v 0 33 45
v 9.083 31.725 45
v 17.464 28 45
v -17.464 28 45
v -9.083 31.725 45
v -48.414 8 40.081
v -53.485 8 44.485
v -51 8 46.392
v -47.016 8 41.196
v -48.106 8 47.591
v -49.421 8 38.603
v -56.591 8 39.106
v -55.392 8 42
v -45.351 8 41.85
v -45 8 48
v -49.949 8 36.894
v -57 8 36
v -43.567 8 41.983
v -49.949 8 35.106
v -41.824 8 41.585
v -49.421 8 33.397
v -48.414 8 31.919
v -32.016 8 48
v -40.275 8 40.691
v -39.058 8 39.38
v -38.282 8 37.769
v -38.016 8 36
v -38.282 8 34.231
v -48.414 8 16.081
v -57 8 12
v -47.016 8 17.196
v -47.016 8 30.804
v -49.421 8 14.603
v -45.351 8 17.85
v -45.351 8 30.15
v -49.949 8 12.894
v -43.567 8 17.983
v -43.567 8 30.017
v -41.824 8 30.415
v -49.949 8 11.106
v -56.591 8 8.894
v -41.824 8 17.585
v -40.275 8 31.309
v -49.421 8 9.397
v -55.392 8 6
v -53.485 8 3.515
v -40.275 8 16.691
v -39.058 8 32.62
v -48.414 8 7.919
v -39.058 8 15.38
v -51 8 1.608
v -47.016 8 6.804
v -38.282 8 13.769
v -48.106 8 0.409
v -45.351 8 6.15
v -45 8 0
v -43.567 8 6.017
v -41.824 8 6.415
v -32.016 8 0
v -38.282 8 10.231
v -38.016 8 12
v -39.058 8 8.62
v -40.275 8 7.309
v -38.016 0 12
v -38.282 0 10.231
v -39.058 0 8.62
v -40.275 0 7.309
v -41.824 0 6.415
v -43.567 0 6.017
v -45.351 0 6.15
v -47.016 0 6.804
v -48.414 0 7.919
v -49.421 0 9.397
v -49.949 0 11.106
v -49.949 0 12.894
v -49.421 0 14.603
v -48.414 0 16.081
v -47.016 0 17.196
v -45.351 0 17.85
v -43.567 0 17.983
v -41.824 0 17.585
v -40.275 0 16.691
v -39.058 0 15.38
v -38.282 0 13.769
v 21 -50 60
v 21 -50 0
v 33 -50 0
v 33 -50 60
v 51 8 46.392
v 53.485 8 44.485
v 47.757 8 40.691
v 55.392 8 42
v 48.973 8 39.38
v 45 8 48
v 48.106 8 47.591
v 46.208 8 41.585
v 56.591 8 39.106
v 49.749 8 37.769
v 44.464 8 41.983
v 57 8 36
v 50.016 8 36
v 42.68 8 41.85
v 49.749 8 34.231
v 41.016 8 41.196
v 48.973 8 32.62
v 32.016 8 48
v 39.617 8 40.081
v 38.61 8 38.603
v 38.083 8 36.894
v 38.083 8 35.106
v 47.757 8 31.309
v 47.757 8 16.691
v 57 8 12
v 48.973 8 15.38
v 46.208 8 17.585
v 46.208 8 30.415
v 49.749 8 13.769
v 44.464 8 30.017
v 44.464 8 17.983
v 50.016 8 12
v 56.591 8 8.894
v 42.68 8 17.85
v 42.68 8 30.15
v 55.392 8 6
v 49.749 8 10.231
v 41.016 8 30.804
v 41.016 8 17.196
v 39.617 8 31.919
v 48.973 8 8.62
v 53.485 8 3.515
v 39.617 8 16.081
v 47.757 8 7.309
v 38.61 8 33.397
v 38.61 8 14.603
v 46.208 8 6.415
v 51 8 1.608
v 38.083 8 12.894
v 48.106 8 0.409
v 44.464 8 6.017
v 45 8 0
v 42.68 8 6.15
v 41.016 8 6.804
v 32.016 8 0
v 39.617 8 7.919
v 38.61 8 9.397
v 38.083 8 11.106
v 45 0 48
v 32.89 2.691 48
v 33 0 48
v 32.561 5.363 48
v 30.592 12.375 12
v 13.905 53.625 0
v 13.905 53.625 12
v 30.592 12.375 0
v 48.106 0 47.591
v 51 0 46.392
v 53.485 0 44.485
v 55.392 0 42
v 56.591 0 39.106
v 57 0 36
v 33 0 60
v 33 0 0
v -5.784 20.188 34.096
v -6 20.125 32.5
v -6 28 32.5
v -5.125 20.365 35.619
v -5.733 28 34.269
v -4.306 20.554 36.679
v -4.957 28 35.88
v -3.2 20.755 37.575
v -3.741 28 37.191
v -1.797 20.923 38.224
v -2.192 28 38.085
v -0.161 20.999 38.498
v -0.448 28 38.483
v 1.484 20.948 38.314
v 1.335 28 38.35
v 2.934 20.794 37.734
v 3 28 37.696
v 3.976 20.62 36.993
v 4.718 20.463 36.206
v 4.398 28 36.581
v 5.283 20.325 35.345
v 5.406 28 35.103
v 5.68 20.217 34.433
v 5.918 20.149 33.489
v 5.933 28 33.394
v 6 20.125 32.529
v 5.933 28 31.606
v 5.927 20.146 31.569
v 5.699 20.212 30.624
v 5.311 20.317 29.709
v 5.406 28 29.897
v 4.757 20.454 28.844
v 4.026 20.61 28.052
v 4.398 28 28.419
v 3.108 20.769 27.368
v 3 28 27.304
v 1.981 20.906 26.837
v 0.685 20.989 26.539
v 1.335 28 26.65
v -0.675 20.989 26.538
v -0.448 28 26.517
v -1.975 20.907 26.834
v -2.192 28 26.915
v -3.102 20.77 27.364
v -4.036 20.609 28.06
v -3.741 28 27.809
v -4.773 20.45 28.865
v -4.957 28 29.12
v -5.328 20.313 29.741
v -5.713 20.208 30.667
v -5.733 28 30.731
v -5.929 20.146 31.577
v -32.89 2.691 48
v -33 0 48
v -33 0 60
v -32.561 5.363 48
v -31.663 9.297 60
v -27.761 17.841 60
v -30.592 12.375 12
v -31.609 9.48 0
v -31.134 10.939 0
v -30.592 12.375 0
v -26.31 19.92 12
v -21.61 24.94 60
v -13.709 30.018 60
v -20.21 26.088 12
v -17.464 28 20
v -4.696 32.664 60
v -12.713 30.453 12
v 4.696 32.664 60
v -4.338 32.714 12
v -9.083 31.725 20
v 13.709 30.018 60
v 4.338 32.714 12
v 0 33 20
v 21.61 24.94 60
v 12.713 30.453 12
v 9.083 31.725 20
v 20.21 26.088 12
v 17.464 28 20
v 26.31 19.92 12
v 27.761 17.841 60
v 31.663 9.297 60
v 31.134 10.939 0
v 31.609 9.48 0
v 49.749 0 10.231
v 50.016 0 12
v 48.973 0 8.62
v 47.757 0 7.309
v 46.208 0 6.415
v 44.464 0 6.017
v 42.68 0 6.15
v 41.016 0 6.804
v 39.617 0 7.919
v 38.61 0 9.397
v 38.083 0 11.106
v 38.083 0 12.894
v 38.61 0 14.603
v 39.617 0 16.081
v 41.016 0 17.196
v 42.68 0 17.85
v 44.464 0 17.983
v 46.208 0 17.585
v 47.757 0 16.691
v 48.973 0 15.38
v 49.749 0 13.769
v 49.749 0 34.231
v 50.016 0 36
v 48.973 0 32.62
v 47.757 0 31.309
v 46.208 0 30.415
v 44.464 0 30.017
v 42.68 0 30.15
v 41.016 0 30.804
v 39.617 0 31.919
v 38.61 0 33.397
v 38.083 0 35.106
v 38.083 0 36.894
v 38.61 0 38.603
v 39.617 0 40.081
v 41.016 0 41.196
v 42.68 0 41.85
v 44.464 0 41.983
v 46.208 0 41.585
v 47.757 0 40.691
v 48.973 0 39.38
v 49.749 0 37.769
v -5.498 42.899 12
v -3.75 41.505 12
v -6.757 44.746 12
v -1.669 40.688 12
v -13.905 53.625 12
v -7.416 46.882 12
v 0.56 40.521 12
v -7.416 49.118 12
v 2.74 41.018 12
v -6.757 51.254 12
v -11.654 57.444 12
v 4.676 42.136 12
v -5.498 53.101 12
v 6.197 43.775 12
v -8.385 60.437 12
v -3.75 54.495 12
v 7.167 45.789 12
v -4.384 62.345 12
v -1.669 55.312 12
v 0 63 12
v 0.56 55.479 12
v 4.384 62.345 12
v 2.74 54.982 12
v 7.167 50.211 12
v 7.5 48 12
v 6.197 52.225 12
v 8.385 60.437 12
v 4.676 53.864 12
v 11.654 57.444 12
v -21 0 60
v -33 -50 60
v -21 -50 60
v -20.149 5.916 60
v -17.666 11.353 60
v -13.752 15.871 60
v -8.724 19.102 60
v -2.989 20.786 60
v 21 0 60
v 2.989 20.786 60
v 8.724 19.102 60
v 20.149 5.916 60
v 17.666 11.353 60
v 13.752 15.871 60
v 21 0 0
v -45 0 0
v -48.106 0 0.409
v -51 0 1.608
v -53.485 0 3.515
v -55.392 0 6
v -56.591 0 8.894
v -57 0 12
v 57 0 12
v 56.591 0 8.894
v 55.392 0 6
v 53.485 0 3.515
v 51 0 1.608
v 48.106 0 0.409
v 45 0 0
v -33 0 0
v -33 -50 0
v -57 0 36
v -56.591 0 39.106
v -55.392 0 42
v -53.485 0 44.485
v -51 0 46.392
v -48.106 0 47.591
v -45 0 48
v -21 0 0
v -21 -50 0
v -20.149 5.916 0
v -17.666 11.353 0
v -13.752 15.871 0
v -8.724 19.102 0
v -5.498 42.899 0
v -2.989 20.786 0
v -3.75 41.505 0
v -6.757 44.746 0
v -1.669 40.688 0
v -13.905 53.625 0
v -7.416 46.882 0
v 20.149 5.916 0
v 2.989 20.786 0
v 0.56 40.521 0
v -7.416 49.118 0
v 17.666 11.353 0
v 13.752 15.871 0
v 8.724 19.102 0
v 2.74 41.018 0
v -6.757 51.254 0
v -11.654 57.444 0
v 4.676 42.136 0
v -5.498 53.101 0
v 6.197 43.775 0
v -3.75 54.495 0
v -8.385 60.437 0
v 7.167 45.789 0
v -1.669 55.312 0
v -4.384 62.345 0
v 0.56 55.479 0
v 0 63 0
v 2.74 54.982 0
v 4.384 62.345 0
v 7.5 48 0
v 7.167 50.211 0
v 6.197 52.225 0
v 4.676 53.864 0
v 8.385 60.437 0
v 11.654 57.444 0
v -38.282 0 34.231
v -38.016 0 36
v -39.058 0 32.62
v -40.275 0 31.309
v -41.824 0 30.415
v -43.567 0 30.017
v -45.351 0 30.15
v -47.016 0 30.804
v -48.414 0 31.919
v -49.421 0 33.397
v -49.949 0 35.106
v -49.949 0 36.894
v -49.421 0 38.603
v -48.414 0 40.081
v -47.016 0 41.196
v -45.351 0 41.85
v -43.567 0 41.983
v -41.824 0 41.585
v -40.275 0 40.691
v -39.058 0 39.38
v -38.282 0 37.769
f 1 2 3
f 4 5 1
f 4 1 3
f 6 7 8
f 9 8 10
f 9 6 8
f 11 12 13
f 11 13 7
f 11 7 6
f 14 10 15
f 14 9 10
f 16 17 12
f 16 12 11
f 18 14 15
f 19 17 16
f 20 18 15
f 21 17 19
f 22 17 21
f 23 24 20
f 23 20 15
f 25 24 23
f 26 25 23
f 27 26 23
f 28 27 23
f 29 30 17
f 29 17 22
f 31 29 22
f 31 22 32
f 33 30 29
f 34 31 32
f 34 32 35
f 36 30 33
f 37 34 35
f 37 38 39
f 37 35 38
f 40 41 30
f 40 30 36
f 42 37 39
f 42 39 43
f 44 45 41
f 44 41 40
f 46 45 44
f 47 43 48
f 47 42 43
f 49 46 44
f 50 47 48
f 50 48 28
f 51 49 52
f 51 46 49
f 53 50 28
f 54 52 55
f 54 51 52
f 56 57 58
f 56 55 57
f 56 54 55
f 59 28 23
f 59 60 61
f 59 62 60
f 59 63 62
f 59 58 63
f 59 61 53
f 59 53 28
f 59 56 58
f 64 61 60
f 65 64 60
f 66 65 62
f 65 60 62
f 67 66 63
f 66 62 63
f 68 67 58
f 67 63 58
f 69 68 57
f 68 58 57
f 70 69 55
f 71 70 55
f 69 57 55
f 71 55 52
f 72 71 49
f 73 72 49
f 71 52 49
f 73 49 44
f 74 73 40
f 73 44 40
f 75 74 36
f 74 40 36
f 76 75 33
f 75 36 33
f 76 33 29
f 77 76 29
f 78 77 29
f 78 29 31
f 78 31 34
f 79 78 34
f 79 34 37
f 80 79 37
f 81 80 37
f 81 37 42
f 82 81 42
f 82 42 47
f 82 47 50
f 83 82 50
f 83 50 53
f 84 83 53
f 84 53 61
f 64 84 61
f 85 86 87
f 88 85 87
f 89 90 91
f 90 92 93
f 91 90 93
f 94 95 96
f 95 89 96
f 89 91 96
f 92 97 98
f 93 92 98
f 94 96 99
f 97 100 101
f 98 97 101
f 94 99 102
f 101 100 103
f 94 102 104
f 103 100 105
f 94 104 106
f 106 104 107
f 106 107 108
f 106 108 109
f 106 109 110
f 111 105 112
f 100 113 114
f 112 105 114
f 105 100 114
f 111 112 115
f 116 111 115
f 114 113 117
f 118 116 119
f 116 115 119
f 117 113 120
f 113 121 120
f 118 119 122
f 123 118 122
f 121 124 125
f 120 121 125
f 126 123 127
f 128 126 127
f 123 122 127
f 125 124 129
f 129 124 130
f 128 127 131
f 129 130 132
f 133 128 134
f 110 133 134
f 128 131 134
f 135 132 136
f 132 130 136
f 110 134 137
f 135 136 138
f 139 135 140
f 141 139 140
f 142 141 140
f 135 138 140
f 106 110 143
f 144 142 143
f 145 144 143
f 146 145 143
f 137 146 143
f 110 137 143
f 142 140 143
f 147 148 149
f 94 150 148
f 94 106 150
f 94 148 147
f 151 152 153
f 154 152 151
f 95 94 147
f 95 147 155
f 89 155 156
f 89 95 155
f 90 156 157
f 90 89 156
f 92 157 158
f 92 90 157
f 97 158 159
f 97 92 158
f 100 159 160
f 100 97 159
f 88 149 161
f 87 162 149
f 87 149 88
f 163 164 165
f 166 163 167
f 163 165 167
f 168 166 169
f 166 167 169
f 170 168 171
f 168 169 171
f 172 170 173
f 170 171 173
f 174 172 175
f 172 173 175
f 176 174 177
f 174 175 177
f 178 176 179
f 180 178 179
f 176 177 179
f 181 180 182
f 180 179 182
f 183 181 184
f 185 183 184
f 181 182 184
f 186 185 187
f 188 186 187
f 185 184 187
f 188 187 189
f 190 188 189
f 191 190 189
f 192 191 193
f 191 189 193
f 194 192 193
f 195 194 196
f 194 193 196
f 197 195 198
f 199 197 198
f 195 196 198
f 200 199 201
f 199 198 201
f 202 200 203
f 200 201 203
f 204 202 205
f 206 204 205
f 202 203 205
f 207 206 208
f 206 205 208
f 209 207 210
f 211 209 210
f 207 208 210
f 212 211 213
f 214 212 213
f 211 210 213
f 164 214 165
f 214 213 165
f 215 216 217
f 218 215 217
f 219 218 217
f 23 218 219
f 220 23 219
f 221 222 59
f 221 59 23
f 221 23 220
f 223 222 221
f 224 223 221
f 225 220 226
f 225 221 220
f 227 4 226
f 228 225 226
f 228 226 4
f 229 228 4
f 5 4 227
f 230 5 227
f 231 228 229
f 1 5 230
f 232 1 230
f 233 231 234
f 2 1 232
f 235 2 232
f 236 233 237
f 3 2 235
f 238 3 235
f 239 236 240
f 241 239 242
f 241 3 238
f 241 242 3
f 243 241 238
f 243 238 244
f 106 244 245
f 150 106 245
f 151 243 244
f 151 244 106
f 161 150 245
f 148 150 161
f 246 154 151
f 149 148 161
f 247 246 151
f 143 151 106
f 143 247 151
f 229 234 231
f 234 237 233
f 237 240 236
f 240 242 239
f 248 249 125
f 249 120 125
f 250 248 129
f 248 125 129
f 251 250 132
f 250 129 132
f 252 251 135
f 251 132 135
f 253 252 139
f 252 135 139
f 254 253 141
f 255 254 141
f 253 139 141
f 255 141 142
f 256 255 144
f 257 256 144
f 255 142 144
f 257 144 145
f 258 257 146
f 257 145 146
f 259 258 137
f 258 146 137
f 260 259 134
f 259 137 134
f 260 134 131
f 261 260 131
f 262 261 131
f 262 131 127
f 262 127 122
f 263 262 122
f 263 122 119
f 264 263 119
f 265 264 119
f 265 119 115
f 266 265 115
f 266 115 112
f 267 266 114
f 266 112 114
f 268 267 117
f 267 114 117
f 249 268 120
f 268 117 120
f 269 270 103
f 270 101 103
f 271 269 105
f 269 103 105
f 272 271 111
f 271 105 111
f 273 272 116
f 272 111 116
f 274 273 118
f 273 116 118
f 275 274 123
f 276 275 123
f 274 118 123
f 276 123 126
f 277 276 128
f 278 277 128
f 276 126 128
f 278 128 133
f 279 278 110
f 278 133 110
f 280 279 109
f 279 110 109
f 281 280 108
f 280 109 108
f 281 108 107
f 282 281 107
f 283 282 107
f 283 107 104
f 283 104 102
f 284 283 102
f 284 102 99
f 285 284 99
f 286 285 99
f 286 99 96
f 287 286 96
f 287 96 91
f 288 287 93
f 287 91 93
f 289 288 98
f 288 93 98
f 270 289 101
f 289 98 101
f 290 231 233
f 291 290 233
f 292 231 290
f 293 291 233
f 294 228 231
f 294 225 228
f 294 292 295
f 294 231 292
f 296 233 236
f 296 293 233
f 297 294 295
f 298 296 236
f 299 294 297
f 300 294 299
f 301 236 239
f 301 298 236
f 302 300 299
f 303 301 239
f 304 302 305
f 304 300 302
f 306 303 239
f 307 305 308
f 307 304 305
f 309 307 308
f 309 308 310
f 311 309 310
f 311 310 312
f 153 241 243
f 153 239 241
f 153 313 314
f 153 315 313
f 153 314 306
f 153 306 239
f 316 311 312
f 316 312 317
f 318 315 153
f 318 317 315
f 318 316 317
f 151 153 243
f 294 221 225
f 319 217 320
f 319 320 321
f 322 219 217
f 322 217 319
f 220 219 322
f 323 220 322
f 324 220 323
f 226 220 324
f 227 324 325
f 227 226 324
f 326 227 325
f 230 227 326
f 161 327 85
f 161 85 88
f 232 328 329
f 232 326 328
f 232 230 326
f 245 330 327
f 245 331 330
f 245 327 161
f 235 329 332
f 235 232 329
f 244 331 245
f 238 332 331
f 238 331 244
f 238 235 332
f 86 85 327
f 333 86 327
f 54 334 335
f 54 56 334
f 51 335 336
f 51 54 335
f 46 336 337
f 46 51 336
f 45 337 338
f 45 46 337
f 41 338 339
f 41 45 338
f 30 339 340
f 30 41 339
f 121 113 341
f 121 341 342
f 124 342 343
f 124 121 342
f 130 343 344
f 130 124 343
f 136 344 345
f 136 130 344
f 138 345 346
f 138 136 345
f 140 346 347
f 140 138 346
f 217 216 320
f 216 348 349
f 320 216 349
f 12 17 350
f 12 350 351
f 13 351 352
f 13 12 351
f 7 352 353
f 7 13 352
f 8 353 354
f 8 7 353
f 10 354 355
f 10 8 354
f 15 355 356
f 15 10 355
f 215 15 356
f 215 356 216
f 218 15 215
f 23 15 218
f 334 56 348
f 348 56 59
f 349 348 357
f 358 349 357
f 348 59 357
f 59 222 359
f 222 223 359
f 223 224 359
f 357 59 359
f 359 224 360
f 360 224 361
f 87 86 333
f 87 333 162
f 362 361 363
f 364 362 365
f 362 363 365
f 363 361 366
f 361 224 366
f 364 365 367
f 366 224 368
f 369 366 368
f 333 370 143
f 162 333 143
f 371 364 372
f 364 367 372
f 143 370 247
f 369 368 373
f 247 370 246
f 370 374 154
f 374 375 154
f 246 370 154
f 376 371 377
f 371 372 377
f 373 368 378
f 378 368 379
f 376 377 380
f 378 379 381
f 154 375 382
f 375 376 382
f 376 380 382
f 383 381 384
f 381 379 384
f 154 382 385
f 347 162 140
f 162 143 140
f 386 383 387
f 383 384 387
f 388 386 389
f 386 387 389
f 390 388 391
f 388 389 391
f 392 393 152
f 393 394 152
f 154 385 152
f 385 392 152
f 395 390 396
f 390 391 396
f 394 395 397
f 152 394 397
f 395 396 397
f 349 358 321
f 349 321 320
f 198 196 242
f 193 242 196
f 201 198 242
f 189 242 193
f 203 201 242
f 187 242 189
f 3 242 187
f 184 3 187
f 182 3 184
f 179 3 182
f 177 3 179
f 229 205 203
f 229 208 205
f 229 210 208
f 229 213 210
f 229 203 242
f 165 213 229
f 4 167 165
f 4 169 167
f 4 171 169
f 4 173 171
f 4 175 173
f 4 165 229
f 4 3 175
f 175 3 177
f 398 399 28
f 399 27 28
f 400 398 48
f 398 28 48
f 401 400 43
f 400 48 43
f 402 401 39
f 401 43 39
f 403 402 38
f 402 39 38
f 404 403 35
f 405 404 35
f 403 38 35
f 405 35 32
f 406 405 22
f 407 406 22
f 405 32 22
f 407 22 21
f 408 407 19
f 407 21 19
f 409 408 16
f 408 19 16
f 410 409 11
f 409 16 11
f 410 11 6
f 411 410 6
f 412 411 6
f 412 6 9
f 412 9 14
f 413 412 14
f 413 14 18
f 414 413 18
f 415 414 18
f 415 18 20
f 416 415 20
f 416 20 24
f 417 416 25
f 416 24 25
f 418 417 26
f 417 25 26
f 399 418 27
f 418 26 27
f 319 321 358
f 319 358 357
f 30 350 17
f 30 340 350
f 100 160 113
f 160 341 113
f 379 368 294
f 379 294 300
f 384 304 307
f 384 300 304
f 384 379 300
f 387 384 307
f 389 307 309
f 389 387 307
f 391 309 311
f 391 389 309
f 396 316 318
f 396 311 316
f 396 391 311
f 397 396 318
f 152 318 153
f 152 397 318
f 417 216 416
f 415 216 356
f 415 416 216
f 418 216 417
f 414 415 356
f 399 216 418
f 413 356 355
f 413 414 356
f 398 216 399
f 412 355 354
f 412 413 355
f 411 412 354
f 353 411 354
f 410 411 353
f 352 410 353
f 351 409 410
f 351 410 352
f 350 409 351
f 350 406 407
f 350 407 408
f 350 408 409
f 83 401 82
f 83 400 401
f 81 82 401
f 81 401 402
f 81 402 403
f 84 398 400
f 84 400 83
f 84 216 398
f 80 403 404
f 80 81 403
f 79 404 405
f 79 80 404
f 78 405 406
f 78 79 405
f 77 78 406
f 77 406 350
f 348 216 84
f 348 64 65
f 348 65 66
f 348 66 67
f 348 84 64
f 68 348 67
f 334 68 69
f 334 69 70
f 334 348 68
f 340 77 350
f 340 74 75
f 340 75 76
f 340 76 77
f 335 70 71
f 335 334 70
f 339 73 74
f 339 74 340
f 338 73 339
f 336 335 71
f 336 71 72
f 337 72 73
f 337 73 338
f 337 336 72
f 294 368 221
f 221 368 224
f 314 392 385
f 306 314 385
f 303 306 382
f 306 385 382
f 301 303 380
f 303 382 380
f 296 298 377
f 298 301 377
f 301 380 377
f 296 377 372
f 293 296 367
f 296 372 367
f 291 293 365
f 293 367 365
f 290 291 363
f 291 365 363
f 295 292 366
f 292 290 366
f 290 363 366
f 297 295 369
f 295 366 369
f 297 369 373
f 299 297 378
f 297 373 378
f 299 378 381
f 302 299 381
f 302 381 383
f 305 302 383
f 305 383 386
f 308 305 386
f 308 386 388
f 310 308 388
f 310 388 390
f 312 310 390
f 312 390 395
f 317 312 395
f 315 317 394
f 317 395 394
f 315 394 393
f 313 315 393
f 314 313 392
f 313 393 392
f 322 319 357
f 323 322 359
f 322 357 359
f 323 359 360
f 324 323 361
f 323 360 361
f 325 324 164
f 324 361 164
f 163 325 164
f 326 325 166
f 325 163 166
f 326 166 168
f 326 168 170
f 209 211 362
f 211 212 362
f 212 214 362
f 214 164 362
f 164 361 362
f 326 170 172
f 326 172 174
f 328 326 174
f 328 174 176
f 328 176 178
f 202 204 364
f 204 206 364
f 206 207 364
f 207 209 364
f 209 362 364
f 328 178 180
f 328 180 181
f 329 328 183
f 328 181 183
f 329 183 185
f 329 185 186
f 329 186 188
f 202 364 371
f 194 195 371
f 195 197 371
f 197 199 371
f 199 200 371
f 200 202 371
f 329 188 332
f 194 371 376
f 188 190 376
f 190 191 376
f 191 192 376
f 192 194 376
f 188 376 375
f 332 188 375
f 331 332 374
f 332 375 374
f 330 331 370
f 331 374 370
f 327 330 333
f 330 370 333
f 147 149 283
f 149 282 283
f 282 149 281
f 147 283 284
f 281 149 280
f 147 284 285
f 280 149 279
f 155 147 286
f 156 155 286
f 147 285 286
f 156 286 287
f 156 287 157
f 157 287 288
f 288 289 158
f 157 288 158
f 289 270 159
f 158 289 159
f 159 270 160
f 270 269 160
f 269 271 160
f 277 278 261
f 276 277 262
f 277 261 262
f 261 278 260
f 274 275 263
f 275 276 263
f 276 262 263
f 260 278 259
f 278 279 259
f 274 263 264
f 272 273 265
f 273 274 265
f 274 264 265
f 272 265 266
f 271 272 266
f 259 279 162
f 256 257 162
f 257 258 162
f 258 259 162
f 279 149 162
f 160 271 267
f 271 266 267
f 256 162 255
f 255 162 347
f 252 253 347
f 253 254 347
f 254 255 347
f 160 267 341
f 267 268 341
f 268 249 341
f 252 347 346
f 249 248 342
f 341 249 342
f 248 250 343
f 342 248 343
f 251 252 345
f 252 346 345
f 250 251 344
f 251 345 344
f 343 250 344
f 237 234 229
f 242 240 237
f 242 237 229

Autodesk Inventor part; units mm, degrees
ref_plane "YZ Plane" through (0, 0, 0) normal (1, 0, 0) x (0, 1, 0)
ref_plane "XY Plane" through (0, 0, 0) normal (0, 0, 1) x (1, 0, 0)
sketch "Boceto1" plane through (0, 0, 0) normal (0, 0, 1) x (1, 0, 0)
  line L0 (0, 100) -> (0, -100) construction
  line L1 (-100, 0) -> (100, 0) construction
  line L2 (-21, -50) -> (-21, 0)
  line L3 (21, -50) -> (21, 0)
  arc A0 (21, 0) -> (-21, 0) centre (0, 0) ccw
  arc A1 (33, 0) -> (-33, 0) centre (0, 0) ccw
  line L4 (-33, 0) -> (-33, -50)
  line L5 (33, 0) -> (33, -50)
  line L6 (-21, -50) -> (-33, -50)
  line L7 (21, -50) -> (33, -50)
  circle A2 centre (0, 48) radius 7.5
  arc A3 (13.9054, 53.625) -> (-13.9054, 53.625) centre (0, 48) ccw
  line L8 (-13.9054, 53.625) -> (-30.5918, 12.375)
  line L9 (13.9054, 53.625) -> (30.5918, 12.375)
  line L10 (-33, 0) -> (-57, 0)
  line L11 (-57, 0) -> (-57, 8)
  line L12 (-57, 8) -> (-32.0156, 8)
  line L13 (100, 0) -> (-100, 0) construction
  line L14 (33, 0) -> (57, 0)
  line L15 (57, 0) -> (57, 8)
  line L16 (57, 8) -> (32.0156, 8)
  point P0 (0, 33)
  dimension "d0" = 200
  dimension "d1" = 200
  dimension "d2" = 50
  dimension "d3" = 50
  dimension "d4" = 42
  dimension "d5" = 33
  dimension "d6" = 15
  dimension "d7" = 48
  dimension "d8" = 15
  dimension "d9" = 24
  dimension "d10" = 8
  dimension "d26" = 33
extrude "Extrusión1" add sketch "Boceto1" along normal blind 60 contours L6 L4 A1 L5 L7 L3 A0 L2
extrude "Extrusión2" add sketch "Boceto1" along normal blind 12 contours L8 A3 L9 A1
extrude "Extrusión3" add sketch "Boceto1" along normal blind 48 contours L10 L11 L12 A1 | A1 L16 L15 L14
fillet "Empalme1" radius 12 4 edges at (57, 4, 48) (-57, 4, 48) (57, 4, 0) (-57, 4, 0)
sketch "Boceto2" plane through (32.0156, 8, 48) normal (0, 1, 0) x (1, 0, 0)
  line L0 (12.9844, 0) -> (0, 0) projected
  line L1 (12.9844, 48) -> (0, 48) projected
  line L2 (0, 0) -> (0, 48) projected
  circle A0 centre (12, 36) radius 6
  circle A1 centre (12, 12) radius 6
  line L3 (-32.0156, 86.4506) -> (-32.0156, -39.8075) construction
  circle A2 centre (-76.0312, 36) radius 6
  circle A3 centre (-76.0312, 12) radius 6
  point P0 (-32.0156, 48)
  dimension "d18" = 12
  dimension "d19" = 12
  dimension "d20" = 12
  dimension "d21" = 12
  dimension "d22" = 12
  dimension "d23" = 12
extrude "Extrusión4" cut sketch "Boceto2" against normal blind 48
ref_plane "Plano de trabajo1" through (0, 33, 0) normal (0, 1, 0) x (-1, 0, 0)
sketch "Boceto3" plane through (0, 33, 0) normal (0, 1, 0) x (-1, 0, 0)
  line L0 (-17.465, 45) -> (17.465, 45)
  line L1 (17.465, 45) -> (17.465, 20)
  line L2 (17.465, 20) -> (-17.465, 20)
  line L3 (-17.465, 20) -> (-17.465, 45)
  line L4 (-17.465, 45) -> (17.465, 20) construction
  line L5 (17.465, 45) -> (-17.465, 20) construction
  line L6 (13.9054, 12) -> (-13.9054, 12) projected
  line L7 (0, -11.8316) -> (0, 73.0134) construction
  circle A0 centre (0, 32.5) radius 6
  point P0 (0, 0)
  dimension "d28" = 8
  dimension "d29" = 25
  dimension "d30" = 34.93
  dimension "d31" = 12
extrude "Extrusión5" cut sketch "Boceto3" against normal blind 5
extrude "Extrusión6" cut sketch "Boceto3" against normal blind 20 contours A0
properties material "Acero inoxidable"
